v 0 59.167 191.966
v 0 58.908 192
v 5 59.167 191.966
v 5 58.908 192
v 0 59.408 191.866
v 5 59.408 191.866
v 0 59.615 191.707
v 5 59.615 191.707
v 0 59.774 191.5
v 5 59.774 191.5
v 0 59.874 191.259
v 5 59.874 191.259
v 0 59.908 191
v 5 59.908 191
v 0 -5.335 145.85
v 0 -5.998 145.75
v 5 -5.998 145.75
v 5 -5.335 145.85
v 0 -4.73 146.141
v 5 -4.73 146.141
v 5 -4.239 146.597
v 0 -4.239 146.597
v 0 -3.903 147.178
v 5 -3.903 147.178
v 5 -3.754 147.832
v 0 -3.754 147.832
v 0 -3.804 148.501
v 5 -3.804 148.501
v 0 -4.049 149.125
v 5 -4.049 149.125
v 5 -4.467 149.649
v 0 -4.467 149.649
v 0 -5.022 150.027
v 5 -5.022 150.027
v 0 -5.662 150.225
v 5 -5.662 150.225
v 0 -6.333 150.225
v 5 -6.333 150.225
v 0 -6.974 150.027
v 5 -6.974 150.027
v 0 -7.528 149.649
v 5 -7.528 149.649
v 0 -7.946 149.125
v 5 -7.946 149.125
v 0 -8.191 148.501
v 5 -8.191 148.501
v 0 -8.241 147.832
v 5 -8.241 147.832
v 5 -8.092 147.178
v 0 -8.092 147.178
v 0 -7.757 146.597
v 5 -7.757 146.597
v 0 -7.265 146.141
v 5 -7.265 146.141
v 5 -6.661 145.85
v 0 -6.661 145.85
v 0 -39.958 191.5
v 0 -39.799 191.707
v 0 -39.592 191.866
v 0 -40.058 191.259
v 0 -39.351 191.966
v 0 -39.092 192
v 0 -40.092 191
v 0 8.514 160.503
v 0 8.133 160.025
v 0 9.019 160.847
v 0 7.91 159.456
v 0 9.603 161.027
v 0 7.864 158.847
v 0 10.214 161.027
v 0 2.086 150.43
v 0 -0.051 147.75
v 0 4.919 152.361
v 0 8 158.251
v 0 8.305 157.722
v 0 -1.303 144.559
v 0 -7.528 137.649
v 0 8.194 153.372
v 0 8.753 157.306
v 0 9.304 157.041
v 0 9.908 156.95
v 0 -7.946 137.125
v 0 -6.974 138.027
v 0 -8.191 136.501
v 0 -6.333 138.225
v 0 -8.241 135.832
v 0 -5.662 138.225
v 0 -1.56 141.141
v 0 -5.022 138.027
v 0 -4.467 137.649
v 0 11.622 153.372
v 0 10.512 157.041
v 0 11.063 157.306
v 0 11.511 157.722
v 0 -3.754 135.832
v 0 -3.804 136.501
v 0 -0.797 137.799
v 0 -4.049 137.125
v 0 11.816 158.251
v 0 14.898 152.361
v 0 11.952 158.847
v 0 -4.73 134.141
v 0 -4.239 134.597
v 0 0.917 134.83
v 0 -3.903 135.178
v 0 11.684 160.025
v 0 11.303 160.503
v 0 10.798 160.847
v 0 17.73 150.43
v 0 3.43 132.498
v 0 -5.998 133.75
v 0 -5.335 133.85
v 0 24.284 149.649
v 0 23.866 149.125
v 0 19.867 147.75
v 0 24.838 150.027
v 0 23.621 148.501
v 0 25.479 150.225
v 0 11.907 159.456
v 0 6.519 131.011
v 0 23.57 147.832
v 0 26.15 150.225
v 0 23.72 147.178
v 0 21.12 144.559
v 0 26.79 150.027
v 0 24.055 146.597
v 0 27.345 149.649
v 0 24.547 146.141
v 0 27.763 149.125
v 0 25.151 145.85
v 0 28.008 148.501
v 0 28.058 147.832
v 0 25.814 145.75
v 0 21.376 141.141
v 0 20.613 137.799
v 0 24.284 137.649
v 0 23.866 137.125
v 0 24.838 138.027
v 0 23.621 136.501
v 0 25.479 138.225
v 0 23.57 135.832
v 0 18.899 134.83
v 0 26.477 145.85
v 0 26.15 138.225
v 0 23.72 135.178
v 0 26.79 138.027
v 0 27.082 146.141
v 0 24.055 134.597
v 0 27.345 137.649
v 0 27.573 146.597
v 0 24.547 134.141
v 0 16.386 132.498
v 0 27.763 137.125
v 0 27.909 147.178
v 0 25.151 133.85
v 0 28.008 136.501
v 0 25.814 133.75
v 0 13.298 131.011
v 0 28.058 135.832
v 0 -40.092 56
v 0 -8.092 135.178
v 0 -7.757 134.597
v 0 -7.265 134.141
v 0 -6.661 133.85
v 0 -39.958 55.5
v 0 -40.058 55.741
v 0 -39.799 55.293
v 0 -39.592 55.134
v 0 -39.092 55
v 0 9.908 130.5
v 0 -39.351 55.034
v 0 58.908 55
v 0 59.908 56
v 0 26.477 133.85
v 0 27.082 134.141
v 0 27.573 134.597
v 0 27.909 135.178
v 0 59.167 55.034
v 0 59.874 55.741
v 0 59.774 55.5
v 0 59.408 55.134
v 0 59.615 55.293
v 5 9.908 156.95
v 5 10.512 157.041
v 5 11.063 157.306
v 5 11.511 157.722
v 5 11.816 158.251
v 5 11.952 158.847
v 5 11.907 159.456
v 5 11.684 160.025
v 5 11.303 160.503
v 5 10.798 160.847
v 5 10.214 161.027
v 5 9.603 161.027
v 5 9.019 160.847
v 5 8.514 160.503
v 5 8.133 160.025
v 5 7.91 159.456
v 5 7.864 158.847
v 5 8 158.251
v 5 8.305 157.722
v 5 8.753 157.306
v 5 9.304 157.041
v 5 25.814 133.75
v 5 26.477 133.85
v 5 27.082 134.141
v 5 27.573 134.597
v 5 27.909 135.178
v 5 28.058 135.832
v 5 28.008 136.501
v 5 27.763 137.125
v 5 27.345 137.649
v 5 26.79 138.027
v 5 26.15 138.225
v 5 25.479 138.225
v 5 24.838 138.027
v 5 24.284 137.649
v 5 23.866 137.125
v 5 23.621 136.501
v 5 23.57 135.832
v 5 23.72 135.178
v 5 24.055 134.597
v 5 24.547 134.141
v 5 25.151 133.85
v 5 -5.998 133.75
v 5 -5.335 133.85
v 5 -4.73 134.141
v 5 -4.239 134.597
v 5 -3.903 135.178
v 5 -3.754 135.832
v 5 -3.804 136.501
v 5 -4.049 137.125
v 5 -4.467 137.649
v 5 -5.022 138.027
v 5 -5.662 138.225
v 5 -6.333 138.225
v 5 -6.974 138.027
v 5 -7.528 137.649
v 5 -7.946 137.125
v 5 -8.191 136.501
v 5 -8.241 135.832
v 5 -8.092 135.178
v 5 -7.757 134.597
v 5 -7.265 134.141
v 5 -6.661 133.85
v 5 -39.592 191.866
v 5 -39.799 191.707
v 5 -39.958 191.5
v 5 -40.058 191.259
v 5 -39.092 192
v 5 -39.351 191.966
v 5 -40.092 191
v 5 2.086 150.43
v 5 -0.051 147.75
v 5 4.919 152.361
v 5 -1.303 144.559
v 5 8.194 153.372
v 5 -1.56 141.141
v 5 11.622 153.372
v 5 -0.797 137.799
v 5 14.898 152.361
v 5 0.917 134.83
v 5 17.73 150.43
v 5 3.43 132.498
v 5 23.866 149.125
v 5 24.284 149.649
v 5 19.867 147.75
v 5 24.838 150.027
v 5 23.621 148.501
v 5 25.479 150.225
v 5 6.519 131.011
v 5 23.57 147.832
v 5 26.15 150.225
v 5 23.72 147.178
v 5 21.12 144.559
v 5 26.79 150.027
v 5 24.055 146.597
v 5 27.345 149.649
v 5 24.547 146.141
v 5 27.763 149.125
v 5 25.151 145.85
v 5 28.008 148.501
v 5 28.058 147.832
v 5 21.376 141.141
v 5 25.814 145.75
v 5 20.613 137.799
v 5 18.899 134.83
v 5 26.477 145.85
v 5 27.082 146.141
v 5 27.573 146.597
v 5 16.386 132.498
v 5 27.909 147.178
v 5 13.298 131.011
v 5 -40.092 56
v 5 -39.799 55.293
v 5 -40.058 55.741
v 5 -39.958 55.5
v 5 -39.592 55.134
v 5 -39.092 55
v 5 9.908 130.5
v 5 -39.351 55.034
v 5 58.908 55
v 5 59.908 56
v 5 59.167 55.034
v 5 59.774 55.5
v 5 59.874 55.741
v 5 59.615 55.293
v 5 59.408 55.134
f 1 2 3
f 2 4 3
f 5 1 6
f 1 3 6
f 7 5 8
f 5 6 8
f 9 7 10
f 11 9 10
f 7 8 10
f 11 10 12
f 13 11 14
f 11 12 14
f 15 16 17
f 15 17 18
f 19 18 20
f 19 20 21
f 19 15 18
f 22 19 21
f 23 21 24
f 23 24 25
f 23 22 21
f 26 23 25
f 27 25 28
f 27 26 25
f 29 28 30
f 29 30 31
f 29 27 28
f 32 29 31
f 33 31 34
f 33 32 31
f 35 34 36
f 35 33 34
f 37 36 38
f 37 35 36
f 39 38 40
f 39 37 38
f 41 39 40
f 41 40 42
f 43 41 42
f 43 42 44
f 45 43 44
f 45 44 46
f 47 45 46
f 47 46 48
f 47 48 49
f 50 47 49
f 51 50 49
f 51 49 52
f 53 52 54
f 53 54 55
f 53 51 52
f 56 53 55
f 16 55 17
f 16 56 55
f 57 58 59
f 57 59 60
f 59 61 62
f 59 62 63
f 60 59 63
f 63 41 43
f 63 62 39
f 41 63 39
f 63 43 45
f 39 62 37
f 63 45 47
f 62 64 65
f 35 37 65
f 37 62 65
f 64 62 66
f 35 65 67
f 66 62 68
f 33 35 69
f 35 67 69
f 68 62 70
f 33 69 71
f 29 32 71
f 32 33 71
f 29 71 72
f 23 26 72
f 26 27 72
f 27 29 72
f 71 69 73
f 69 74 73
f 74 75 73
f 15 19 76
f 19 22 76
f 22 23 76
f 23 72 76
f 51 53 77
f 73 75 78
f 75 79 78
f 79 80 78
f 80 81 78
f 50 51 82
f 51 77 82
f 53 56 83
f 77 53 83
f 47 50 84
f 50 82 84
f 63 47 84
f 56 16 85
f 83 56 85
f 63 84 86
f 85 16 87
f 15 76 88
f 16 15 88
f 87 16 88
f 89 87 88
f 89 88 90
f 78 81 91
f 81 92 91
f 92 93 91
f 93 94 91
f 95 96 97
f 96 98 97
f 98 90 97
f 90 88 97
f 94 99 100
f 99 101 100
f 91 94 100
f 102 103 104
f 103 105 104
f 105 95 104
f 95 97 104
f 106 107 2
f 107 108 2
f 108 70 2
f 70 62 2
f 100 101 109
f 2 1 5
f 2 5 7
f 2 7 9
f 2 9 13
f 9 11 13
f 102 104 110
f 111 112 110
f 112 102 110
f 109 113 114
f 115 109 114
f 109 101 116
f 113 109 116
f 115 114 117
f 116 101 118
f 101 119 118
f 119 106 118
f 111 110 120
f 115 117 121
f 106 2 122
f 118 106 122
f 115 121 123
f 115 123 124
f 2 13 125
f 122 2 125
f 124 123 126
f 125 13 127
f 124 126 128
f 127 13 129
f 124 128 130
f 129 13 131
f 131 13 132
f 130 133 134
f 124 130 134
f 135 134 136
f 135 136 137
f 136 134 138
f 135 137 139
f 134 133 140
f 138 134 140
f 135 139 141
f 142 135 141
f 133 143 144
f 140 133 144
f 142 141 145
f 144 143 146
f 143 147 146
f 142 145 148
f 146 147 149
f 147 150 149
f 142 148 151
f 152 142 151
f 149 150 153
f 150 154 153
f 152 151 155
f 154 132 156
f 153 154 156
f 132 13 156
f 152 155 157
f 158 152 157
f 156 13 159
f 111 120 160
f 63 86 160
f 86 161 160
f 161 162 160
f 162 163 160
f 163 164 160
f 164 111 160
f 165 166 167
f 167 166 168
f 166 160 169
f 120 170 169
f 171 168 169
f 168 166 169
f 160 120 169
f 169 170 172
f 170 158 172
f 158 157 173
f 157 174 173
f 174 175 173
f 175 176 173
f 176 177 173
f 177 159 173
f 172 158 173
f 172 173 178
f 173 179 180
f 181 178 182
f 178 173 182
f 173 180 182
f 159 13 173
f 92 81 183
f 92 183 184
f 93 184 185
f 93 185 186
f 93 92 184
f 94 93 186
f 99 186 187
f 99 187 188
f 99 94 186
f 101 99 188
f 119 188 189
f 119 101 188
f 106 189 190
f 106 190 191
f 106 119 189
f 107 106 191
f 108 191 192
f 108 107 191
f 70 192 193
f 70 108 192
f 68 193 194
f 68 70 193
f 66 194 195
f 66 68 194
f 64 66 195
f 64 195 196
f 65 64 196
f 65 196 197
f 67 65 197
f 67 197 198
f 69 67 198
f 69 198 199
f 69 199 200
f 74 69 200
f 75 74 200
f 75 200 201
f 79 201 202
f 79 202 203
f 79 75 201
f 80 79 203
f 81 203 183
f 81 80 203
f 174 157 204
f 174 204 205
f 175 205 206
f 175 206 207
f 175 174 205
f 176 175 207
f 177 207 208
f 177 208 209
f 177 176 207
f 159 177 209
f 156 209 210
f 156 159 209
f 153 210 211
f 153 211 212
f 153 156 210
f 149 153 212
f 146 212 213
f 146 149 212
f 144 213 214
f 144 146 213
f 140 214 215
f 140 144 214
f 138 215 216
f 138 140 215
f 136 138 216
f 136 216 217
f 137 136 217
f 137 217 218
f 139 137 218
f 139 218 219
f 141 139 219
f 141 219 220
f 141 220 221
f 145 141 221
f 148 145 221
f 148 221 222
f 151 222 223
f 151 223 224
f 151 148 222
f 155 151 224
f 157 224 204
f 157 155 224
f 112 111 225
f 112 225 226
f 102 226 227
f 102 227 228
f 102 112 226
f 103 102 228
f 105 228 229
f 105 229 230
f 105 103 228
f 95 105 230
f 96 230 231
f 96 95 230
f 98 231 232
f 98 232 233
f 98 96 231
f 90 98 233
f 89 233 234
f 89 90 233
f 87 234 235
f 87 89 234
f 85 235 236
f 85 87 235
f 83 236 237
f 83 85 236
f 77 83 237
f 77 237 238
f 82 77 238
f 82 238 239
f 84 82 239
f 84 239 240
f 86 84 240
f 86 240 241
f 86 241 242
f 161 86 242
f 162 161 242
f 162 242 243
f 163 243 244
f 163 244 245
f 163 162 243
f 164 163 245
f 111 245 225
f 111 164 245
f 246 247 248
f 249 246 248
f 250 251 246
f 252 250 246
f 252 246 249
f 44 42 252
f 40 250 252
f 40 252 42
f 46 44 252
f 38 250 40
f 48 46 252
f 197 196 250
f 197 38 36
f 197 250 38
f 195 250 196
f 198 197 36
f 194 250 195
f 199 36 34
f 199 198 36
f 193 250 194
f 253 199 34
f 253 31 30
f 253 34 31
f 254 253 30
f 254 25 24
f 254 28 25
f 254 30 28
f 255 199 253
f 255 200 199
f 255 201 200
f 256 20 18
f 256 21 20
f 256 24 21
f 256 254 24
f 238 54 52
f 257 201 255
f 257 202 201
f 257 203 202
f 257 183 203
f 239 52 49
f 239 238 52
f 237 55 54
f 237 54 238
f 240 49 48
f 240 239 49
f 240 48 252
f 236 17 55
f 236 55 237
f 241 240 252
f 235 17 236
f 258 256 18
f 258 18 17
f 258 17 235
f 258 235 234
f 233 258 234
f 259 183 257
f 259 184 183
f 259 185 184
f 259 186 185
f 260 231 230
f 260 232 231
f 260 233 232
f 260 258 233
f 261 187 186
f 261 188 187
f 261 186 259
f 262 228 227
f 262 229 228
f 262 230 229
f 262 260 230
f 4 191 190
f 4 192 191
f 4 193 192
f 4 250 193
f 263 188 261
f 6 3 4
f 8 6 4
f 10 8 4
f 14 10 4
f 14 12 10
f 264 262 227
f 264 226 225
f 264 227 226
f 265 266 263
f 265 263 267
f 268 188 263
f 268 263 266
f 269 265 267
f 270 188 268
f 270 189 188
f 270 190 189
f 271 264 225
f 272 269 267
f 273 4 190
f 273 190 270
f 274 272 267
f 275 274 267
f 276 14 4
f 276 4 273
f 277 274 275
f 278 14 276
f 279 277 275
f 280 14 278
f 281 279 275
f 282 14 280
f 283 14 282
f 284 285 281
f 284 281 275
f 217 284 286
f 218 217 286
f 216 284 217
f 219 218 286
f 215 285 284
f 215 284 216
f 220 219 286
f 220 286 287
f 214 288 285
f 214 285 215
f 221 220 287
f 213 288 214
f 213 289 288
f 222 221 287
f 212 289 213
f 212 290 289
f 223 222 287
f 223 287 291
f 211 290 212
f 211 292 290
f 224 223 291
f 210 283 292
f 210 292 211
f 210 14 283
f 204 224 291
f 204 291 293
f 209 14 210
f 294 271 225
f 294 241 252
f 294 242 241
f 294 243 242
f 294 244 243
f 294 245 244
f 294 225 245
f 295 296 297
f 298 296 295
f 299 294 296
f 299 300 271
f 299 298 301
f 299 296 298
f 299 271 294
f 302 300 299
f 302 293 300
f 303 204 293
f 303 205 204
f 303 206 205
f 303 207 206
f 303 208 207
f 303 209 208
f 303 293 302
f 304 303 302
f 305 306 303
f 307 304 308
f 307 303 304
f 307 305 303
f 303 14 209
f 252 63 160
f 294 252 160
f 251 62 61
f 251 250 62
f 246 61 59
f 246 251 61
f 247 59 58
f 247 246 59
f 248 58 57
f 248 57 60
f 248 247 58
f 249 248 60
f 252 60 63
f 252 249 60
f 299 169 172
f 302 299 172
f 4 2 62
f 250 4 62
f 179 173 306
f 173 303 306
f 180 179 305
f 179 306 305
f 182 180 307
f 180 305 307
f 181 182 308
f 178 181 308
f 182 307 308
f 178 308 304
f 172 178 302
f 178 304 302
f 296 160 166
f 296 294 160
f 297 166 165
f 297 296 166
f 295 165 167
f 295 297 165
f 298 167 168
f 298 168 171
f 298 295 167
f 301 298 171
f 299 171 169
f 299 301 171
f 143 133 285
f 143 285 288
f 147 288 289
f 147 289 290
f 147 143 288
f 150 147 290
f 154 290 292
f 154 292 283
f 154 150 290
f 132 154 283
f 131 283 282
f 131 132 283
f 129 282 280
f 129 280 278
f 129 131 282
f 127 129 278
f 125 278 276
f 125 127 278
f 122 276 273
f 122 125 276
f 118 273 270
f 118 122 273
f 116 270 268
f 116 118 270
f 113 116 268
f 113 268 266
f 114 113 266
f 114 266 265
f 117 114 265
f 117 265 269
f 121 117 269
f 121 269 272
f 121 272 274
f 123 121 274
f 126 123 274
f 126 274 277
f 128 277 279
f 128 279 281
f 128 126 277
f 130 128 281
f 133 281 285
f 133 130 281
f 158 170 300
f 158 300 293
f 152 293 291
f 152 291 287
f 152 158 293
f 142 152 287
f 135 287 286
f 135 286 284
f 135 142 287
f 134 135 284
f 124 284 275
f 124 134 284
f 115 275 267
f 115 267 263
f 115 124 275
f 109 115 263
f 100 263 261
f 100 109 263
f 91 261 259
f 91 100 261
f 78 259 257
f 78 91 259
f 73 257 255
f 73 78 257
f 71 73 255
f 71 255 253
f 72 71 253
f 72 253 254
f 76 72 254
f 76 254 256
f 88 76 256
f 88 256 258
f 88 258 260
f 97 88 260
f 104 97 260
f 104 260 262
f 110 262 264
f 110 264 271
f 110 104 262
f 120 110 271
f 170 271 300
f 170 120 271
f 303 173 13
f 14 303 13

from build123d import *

# Parameters (mm, degrees)
SKIZZE1_R                       = 11.5
SKIZZE1_R_2                     = 2.25
SKIZZE1_R_3                     = 2.05
AUFSATZ_LINEAR_AUSTRAGEN1_DEPTH = 5
VERRUNDUNG1_R                   = 1


with BuildPart() as part:
    # Skizze1 → Aufsatz-Linear austragen1 (new body)
    with BuildSketch(Plane(origin=(0, 0, 0), x_dir=(0, 0, -1), z_dir=(1, 0, 0))):
        Polygon((-92, 59.908196572), (-192, 59.908196572), (-192, -40.091803428), (-92, -40.091803428), (-55, -40.091803428), (-55, 59.908196572), align=None)
        with Locations((-142, 9.908196572)):
            Circle(SKIZZE1_R, mode=Mode.SUBTRACT)
        with Locations((-148, 25.814170293)):
            Circle(SKIZZE1_R_2, mode=Mode.SUBTRACT)
        with Locations((-136, 25.814170293)):
            Circle(SKIZZE1_R_2, mode=Mode.SUBTRACT)
        with Locations((-159, 9.908196572)):
            Circle(SKIZZE1_R_3, mode=Mode.SUBTRACT)
        with Locations((-148, -5.997777148)):
            Circle(SKIZZE1_R_2, mode=Mode.SUBTRACT)
        with Locations((-136, -5.997777148)):
            Circle(SKIZZE1_R_2, mode=Mode.SUBTRACT)
    extrude(amount=AUFSATZ_LINEAR_AUSTRAGEN1_DEPTH)

    # Verrundung1
    verrundung1_edges = [part.edges().sort_by_distance(p)[0] for p in [
        (2.5, 59.908196572, 192),
        (2.5, 59.908196572, 55),
        (2.5, -40.091803428, 55),
        (2.5, -40.091803428, 192),
    ]]
    fillet(verrundung1_edges, radius=VERRUNDUNG1_R)


solid = part.part
